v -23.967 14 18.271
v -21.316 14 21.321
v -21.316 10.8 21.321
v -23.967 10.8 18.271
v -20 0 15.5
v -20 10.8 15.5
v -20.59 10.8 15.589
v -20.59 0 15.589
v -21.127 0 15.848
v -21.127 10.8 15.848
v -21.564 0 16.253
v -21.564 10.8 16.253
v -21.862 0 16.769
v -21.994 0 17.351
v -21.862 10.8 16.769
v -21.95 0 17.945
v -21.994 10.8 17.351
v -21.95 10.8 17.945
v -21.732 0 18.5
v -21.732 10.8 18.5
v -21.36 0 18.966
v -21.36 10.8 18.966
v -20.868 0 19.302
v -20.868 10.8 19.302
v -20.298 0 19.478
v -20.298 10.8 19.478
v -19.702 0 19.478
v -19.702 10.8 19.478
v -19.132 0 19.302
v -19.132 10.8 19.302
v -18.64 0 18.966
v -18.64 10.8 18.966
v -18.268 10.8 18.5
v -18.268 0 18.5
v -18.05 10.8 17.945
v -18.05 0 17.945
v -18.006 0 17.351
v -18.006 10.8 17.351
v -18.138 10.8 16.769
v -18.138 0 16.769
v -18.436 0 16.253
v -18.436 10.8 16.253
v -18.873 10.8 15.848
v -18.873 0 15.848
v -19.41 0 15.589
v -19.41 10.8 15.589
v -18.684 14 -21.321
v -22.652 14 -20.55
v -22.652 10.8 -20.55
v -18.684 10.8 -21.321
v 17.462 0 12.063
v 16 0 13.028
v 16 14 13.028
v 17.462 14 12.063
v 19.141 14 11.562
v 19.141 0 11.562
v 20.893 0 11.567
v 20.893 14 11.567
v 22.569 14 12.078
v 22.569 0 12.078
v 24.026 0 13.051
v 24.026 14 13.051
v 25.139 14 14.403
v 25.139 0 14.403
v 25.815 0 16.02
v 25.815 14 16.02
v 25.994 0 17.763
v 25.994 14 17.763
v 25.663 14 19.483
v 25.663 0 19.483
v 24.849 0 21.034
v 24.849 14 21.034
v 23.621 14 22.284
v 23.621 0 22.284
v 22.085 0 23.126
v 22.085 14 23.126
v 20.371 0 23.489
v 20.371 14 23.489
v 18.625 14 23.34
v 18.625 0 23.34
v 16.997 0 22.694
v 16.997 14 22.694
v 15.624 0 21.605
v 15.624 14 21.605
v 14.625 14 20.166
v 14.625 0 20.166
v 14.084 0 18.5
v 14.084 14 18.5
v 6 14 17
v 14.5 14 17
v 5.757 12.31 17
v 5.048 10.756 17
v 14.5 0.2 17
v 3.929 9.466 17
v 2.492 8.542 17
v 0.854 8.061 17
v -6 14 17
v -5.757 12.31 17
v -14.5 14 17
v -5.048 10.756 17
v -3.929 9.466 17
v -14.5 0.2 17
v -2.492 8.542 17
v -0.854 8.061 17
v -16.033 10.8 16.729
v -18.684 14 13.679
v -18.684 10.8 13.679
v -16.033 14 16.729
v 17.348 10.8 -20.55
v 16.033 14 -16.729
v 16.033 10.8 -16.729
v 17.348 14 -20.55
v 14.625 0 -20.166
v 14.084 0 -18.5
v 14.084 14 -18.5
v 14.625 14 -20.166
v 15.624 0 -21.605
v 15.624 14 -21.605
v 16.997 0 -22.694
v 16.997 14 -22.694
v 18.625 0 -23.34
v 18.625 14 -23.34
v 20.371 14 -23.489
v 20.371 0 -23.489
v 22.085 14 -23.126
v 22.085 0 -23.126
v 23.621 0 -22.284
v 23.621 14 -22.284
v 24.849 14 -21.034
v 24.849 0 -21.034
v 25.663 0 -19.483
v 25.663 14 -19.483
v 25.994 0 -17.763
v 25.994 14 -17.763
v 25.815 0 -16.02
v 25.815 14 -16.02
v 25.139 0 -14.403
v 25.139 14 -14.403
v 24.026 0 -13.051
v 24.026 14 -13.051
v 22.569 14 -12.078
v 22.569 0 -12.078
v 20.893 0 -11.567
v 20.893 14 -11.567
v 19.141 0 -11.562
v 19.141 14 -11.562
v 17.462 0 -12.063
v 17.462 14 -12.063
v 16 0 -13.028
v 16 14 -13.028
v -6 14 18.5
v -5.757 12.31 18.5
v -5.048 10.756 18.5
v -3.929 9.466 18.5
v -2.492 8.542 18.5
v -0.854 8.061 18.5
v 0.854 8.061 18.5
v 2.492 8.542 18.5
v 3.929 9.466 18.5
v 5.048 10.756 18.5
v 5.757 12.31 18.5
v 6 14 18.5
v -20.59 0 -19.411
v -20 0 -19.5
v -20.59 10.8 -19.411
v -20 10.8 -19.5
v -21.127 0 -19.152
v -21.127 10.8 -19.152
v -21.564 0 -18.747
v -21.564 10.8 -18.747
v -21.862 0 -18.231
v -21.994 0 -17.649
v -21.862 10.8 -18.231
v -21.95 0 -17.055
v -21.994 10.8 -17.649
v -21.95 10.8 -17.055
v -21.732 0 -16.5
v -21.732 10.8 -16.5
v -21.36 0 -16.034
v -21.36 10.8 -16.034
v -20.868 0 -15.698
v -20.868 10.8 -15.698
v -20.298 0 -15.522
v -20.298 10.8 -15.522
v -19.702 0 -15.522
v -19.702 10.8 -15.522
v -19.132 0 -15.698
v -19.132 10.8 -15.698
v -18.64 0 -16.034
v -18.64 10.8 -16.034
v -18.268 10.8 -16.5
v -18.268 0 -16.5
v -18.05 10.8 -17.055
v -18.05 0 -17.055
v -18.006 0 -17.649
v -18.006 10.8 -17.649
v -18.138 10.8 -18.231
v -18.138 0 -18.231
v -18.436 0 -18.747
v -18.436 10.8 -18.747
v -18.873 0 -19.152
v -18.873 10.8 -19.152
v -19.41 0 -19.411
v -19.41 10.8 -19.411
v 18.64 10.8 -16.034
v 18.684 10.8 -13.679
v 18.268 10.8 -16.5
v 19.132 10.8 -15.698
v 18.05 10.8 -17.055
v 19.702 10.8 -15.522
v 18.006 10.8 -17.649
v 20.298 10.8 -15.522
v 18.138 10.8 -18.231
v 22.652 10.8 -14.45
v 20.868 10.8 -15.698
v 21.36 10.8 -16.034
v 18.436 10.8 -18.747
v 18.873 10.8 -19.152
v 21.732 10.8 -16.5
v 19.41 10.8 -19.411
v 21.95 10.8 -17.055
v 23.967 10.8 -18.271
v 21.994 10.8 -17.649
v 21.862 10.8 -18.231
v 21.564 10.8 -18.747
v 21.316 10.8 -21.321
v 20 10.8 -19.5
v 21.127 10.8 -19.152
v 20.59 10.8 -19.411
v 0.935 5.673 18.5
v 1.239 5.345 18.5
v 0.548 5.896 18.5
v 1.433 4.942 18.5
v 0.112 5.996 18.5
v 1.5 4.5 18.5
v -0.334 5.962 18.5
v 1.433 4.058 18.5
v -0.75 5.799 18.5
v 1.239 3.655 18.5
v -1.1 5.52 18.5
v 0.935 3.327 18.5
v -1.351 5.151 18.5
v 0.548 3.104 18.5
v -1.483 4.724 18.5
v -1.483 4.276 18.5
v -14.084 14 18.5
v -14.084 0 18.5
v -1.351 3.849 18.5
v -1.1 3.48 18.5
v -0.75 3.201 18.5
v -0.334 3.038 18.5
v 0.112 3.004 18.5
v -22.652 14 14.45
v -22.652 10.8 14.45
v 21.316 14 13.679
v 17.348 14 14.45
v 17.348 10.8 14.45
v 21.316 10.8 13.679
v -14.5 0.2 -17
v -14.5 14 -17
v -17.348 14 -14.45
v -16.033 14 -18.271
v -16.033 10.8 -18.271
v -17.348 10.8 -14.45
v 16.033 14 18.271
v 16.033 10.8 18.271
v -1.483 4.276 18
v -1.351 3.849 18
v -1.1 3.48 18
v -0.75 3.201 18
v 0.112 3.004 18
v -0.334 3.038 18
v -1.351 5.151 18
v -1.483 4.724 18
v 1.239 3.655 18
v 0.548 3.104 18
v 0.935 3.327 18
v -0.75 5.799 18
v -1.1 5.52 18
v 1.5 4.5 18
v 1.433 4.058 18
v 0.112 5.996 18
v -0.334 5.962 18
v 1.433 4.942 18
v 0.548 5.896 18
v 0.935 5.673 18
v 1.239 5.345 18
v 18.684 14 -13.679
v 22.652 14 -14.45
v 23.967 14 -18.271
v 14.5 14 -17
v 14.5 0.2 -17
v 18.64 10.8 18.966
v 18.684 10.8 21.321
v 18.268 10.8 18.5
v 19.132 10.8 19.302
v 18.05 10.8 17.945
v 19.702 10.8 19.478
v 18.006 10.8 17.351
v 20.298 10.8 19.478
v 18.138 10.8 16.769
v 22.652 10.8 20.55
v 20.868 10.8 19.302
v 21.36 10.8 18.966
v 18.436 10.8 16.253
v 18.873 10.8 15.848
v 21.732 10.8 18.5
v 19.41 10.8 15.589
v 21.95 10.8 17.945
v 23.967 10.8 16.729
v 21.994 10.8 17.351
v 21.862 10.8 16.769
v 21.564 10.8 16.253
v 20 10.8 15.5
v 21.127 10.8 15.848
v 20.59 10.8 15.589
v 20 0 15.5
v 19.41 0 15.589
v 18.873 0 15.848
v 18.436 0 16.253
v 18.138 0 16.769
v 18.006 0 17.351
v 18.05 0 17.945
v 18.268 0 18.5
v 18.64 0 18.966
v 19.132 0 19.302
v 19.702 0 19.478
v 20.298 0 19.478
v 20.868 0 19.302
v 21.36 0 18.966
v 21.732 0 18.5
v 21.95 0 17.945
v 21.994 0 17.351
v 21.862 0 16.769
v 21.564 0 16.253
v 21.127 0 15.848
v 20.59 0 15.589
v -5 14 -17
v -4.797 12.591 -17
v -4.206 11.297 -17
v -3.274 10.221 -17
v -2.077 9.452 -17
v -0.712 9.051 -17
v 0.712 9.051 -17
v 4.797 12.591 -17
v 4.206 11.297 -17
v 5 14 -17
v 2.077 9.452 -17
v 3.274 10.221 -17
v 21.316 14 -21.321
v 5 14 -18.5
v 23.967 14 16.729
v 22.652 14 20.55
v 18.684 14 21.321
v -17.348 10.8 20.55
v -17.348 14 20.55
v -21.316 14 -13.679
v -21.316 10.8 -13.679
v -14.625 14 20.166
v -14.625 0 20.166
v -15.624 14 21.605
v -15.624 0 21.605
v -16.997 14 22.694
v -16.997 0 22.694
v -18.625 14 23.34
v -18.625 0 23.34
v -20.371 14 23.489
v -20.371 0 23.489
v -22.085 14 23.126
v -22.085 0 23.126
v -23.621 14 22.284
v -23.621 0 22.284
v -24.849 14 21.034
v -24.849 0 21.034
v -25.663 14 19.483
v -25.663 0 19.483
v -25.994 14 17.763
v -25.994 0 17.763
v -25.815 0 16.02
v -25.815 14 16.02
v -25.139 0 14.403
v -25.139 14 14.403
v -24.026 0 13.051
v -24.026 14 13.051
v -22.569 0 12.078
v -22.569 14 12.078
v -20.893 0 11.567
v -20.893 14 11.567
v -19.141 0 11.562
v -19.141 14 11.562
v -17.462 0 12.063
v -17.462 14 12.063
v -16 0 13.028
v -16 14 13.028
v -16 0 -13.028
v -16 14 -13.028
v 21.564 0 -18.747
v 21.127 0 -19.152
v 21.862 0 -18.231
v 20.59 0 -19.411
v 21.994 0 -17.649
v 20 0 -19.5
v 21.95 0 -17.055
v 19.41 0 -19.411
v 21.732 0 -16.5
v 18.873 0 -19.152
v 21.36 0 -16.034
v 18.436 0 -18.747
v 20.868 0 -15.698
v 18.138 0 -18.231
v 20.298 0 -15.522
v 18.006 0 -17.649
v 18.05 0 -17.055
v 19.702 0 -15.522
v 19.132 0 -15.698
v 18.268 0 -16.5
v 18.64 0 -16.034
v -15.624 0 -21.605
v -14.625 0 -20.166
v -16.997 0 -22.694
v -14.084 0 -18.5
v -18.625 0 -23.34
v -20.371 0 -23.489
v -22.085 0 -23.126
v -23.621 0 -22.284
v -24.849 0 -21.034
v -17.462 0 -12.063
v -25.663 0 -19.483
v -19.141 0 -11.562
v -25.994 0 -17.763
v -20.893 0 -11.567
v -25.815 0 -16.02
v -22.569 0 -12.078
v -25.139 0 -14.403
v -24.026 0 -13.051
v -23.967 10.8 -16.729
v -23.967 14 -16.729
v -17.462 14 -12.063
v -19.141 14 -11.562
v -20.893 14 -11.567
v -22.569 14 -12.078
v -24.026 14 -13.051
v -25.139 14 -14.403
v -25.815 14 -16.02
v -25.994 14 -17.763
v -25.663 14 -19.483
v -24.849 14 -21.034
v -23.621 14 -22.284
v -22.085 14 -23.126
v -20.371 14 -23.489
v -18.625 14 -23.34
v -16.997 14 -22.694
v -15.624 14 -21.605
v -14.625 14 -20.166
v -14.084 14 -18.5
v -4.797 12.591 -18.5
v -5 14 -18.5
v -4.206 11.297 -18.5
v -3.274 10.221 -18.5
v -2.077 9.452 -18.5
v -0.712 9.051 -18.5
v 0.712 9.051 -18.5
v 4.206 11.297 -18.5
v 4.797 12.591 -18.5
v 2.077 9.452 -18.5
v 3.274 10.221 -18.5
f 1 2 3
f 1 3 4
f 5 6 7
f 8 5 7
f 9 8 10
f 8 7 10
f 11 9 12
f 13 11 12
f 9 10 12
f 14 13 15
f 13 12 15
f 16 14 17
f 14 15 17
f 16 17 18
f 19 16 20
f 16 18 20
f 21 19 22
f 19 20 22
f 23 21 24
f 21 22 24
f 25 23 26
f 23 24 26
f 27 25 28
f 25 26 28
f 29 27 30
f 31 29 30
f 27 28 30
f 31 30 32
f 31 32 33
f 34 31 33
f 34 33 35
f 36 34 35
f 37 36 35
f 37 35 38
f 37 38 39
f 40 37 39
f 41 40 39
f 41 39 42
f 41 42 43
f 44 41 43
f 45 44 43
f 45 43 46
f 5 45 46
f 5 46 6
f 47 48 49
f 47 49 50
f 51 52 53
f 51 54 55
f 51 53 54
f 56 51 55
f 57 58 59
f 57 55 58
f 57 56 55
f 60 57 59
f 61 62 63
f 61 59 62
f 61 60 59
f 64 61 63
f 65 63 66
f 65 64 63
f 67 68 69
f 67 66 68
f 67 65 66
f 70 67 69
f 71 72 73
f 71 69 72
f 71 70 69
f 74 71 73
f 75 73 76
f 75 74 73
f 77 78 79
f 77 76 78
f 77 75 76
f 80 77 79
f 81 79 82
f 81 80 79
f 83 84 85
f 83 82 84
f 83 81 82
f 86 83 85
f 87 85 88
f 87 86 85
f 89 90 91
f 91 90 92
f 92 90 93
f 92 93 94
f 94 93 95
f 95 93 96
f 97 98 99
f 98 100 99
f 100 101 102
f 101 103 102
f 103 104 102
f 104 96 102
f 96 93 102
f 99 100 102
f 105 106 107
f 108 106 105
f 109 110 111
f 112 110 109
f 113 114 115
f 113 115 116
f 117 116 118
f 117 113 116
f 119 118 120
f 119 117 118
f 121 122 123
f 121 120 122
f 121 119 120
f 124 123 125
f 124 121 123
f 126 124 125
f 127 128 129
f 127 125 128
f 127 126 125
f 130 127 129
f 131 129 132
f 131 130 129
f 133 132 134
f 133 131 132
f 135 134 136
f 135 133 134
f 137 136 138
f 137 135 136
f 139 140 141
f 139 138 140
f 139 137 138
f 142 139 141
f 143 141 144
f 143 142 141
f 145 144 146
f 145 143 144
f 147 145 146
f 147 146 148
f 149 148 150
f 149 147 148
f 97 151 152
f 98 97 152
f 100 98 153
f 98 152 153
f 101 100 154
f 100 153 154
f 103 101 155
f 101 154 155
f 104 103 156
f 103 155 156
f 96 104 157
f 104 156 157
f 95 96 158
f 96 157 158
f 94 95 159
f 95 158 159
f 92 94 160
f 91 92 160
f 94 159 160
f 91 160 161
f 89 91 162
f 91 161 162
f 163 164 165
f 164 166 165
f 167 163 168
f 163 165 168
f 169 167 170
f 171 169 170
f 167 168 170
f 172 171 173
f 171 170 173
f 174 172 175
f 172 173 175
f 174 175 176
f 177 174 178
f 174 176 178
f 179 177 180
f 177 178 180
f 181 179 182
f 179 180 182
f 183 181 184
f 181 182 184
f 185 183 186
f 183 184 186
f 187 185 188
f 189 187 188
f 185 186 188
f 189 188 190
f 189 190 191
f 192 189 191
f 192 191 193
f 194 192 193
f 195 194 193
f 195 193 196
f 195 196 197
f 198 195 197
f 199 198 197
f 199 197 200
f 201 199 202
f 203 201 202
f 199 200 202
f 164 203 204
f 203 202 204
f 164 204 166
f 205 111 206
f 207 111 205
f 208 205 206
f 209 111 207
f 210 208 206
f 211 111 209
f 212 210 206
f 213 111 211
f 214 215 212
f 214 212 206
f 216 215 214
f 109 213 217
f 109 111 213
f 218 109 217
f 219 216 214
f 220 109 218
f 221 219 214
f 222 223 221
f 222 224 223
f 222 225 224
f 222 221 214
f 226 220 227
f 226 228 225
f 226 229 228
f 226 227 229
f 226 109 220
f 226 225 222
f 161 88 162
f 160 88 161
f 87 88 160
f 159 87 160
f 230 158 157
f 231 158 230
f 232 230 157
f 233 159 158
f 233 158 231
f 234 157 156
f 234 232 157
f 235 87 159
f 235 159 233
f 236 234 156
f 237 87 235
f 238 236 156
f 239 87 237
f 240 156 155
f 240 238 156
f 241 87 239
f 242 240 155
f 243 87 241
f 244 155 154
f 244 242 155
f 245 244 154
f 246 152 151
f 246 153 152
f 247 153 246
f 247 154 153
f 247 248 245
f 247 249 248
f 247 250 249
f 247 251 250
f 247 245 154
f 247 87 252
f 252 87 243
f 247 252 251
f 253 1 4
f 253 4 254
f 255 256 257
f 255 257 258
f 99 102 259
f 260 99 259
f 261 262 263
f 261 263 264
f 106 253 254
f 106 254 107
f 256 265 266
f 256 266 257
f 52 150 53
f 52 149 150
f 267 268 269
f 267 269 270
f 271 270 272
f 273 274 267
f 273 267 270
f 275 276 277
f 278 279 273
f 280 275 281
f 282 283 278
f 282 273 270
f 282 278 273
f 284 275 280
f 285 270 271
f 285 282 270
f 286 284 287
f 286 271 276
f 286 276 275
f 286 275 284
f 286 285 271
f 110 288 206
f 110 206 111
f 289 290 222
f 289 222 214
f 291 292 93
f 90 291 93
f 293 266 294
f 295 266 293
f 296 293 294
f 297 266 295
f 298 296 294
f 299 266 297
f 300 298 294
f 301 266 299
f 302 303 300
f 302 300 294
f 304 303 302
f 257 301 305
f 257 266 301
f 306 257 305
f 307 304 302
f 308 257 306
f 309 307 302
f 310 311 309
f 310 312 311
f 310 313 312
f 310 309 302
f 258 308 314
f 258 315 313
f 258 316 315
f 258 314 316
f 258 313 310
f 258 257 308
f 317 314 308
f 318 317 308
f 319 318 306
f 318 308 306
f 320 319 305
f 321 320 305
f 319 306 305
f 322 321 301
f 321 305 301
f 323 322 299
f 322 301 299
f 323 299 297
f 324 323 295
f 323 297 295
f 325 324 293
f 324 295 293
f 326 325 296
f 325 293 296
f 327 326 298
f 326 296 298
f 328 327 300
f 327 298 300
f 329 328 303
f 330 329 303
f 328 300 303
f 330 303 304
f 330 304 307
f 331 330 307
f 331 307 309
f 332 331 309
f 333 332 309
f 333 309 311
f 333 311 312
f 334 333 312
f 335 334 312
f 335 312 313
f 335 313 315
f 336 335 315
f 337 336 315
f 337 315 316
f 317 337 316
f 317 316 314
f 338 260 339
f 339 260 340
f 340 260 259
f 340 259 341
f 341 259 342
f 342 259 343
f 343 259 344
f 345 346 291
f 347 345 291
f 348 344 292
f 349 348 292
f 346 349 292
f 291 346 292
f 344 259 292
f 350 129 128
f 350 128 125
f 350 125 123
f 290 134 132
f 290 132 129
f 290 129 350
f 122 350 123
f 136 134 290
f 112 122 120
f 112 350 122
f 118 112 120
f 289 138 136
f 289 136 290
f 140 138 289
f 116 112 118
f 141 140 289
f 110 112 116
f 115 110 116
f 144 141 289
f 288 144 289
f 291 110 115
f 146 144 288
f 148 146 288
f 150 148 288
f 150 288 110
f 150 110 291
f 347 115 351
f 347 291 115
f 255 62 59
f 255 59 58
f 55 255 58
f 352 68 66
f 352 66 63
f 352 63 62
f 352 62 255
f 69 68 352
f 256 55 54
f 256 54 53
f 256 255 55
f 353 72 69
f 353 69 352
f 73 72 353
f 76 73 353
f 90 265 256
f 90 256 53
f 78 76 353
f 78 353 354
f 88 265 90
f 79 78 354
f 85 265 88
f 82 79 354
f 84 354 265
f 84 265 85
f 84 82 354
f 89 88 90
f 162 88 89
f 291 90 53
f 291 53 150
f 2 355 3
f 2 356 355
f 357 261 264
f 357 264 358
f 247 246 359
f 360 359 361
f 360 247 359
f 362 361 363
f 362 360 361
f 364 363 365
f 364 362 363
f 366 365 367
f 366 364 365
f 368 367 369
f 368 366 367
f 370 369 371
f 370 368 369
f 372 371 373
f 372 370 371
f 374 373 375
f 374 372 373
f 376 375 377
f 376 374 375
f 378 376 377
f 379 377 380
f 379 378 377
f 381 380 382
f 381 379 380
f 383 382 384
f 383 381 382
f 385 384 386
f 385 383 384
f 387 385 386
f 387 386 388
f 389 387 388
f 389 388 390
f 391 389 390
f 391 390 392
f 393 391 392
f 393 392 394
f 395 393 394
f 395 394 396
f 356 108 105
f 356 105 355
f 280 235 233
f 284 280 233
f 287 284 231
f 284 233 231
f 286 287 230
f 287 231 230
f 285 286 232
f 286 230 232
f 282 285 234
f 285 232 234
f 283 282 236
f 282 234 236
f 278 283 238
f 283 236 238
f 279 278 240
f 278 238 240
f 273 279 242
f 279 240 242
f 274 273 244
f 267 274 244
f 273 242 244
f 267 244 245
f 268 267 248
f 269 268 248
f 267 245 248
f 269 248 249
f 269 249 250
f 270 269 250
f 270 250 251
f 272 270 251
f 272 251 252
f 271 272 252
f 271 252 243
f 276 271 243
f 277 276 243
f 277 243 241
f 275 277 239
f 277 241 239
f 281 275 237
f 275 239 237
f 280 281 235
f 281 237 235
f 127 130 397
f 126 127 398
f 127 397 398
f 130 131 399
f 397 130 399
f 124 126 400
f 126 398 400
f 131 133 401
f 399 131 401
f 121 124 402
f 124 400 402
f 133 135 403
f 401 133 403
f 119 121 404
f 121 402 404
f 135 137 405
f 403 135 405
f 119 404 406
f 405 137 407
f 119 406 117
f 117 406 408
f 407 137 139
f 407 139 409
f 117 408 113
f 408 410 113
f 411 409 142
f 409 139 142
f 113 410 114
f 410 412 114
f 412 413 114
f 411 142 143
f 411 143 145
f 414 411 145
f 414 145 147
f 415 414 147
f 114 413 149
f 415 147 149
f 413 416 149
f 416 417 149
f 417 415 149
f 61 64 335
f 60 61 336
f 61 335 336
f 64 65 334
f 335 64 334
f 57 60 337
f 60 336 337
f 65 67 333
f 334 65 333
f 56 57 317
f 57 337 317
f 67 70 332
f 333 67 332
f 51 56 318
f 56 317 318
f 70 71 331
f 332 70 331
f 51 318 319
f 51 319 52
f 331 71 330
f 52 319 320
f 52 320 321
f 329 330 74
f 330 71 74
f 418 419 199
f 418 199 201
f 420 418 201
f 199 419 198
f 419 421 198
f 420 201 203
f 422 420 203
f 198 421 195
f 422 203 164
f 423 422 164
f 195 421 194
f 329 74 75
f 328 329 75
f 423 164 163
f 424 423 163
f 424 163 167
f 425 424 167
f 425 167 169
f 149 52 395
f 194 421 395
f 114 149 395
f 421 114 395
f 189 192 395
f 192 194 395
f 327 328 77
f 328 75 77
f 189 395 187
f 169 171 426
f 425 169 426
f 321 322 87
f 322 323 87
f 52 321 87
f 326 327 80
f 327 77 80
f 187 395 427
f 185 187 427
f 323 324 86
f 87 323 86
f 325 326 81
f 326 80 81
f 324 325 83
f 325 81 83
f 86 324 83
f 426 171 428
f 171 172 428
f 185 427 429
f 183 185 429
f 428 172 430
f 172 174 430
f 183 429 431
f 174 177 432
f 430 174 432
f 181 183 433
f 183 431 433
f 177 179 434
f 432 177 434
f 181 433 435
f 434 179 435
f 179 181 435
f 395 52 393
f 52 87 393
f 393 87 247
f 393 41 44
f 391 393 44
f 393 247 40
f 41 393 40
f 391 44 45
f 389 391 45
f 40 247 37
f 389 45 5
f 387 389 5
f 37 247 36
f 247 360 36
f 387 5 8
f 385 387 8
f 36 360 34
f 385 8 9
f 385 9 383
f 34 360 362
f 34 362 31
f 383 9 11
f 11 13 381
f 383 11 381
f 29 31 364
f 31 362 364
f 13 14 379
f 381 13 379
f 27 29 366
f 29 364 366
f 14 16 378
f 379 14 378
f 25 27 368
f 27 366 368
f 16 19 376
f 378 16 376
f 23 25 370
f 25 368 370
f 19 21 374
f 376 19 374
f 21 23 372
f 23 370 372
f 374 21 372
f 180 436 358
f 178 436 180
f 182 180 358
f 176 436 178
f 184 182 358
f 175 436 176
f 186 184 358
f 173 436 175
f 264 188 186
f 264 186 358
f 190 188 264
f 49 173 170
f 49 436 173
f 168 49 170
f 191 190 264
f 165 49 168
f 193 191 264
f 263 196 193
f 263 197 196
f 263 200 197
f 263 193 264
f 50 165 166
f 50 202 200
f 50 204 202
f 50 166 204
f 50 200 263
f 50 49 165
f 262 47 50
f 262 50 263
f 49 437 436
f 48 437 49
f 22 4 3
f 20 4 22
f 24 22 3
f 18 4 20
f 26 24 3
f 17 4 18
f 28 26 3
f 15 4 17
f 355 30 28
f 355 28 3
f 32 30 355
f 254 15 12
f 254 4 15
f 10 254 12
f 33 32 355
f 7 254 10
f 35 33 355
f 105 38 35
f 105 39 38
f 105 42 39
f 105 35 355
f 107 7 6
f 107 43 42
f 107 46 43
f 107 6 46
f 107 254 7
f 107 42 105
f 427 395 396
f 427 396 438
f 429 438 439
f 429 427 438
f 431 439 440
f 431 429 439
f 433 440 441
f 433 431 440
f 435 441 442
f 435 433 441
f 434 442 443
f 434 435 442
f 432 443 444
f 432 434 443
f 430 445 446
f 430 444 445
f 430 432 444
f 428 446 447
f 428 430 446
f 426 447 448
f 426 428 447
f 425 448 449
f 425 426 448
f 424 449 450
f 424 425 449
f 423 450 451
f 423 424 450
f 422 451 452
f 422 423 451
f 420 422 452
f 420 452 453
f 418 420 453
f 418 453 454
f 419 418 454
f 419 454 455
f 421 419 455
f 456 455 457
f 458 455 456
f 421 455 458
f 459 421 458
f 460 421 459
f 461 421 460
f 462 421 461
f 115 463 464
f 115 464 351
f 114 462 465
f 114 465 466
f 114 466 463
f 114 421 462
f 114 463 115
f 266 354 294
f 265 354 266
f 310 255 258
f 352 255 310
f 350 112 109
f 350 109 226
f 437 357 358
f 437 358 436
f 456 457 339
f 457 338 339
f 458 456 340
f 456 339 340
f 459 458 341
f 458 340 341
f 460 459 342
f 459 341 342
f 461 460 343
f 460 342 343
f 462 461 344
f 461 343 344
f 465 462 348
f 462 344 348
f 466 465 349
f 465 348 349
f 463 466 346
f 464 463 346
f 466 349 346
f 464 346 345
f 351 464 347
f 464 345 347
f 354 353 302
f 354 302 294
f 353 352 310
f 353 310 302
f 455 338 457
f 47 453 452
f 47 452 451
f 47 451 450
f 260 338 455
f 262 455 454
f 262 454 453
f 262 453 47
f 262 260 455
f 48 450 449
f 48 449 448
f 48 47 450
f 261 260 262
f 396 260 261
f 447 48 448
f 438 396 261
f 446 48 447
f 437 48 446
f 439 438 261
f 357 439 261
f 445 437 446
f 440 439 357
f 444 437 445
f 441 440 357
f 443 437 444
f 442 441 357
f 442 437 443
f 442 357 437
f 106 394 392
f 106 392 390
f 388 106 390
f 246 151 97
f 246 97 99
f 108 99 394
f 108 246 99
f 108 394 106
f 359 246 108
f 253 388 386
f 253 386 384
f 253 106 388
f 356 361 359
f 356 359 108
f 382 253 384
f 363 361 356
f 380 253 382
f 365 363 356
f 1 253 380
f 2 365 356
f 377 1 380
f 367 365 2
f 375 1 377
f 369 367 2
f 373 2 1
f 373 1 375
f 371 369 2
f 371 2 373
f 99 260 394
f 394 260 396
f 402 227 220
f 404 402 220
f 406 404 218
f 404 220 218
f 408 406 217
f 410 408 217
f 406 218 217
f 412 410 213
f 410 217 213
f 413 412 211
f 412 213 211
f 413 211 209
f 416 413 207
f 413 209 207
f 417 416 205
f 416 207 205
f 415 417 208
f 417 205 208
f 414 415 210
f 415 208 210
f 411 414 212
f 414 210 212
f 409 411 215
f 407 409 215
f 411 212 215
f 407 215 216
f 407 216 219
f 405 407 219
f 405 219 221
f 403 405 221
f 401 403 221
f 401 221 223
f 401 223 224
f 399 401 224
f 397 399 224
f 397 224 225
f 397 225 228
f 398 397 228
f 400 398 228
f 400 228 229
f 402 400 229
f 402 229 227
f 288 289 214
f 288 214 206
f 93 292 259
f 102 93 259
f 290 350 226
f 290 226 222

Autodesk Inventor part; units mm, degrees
ref_plane "YZ Plane" through (0, 0, 0) normal (1, 0, 0) x (0, 1, 0)
ref_plane "XZ Plane" through (0, 0, 0) normal (0, 1, 0) x (-1, 0, 0)
ref_plane "XY Plane" through (0, 0, 0) normal (0, 0, 1) x (1, 0, 0)
sketch "Sketch1" plane through (0, 0, 0) normal (0, 1, 0) x (-1, 0, 0)
  line L0 (-14.5, 17) -> (14.5, 17)
  line L1 (14.5, 17) -> (14.5, -17)
  line L2 (14.5, -17) -> (-14.5, -17)
  line L3 (-14.5, -17) -> (-14.5, 17)
  line L4 (-14.5, 17) -> (14.5, -17) construction
  line L5 (14.5, 17) -> (-14.5, -17) construction
  circle A0 centre (-20, 17.5) radius 6
  circle A1 centre (20, 17.5) radius 6
  circle A2 centre (20, -17.5) radius 6
  circle A3 centre (-20, -17.5) radius 6
  line L6 (-16, 18.5) -> (16, 18.5)
  line L7 (16, 18.5) -> (16, -18.5)
  line L8 (16, -18.5) -> (-16, -18.5)
  line L9 (-16, -18.5) -> (-16, 18.5)
  line L10 (-16, 18.5) -> (16, -18.5) construction
  line L11 (16, 18.5) -> (-16, -18.5) construction
  point P0 (0, 0)
  point P1 (-16, -13.0279)
  point P2 (-14.0839, -18.5)
  point P3 (14.0839, -18.5)
  point P4 (16, -13.0279)
  point P5 (16, 13.0279)
  point P6 (14.0839, 18.5)
  point P7 (-14.0839, 18.5)
  point P8 (-16, 13.0279)
  point P9 (-14.5, -15.1021)
  point P10 (-14.0209, -17)
  point P11 (14.0209, -17)
  point P12 (14.5, -15.1021)
  point P13 (14.5, 15.1021)
  point P14 (14.0209, 17)
  point P15 (-14.0209, 17)
  point P16 (-14.5, 15.1021)
  dimension "d0" = 29
  dimension "d1" = 34
  dimension "d2" = 12
  dimension "d3" = 12
  dimension "d4" = 12
  dimension "d5" = 12
  dimension "d6" = 35
  dimension "d8" = 40
  dimension "d9" = 40
  dimension "d13" = 5.5
  dimension "d14" = 0.5
  dimension "d15" = 1.5
  dimension "d16" = 1.5
extrude "Extrusion1" add sketch "Sketch1" along normal blind 14 contours L3 A0 L9 L6 L0 | A0 L6 A1 L0 | L3 A3 L9 A0 | A1 L6 L7 L1 L0 | L3 L2 A3 L8 L9 | A0 L6 L9 | A1 L7 L6 | A1 L7 A2 L1 | L2 A2 L8 A3 | L9 L8 A3 | A2 L7 L8 L2 L1 | A2 L8 L7
extrude "Extrusion2" add sketch "Sketch1" along normal blind 0.2 contours L0 A1 L1 A2 L2 A3 L3 A0
hole "Hole1" at (-20, 0, -17.5) at (20, 0, -17.5) at (20, 0, 17.5) at (-20, 0, 17.5) direction (0, 1, 0) diameter 4 end through all
extrude "Extrusion3" add sketch "Sketch1" along normal blind 0.2 contours L0 A0 L3 | L0 L1 A1 | A3 L2 L3 | L1 L2 A2
sketch "Sketch2" plane through (0, 14, 0) normal (0, 1, 0) x (1, 0, 0)
  arc A0 (-16, -13.0279) -> (-14.0839, -18.5) centre (-20, -17.5) ccw projected
  line L0 (-17.3483, -20.5499) -> (-21.3155, -21.3214)
  line L1 (-21.3155, -21.3214) -> (-23.9671, -18.2714)
  line L2 (-23.9671, -18.2714) -> (-22.6517, -14.4501)
  line L3 (-22.6517, -14.4501) -> (-18.6845, -13.6786)
  line L4 (-18.6845, -13.6786) -> (-16.0329, -16.7286)
  line L5 (-16.0329, -16.7286) -> (-17.3483, -20.5499)
  line L6 (-10.7502, -12.1358) -> (-10.7502, 6.4156) construction
  line L7 (-10.7502, 6.4156) -> (-3.4446, 6.4156) construction
  line L8 (-22.6517, 20.5499) -> (-18.6845, 21.3214)
  line L9 (-18.6845, 21.3214) -> (-16.0329, 18.2714)
  line L10 (-16.0329, 18.2714) -> (-17.3483, 14.4501)
  line L11 (-17.3483, 14.4501) -> (-21.3155, 13.6786)
  line L12 (-21.3155, 13.6786) -> (-23.9671, 16.7286)
  line L13 (-23.9671, 16.7286) -> (-22.6517, 20.5499)
  line L14 (17.3483, -14.4501) -> (21.3155, -13.6786)
  line L15 (21.3155, -13.6786) -> (23.9671, -16.7286)
  line L16 (23.9671, -16.7286) -> (22.6517, -20.5499)
  line L17 (22.6517, -20.5499) -> (18.6845, -21.3214)
  line L18 (18.6845, -21.3214) -> (16.0329, -18.2714)
  line L19 (16.0329, -18.2714) -> (17.3483, -14.4501)
  line L20 (17.3483, 20.5499) -> (21.3155, 21.3214)
  line L21 (21.3155, 21.3214) -> (23.9671, 18.2714)
  line L22 (23.9671, 18.2714) -> (22.6517, 14.4501)
  line L23 (22.6517, 14.4501) -> (18.6845, 13.6786)
  line L24 (18.6845, 13.6786) -> (16.0329, 16.7286)
  line L25 (16.0329, 16.7286) -> (17.3483, 20.5499)
  point P0 (0, 0)
  dimension "d30" = 7
  dimension "d33" = 35
  dimension "d36" = 40
extrude "Extrusion4" cut sketch "Sketch2" against normal blind 3.2
sketch "Sketch3" plane through (-14.0839, 0, 18.5) normal (0, 0, 1) x (1, 0, 0)
  line L0 (28.1678, 14) -> (0, 14) projected
  arc A0 (8.0839, 14) -> (20.0839, 14) centre (14.0839, 14) ccw
  point P0 (14.0839, 0)
  dimension "d41" = 12
extrude "Extrusion5" cut sketch "Sketch3" against normal up to surface (1.5 mm away)
sketch "Sketch4" plane through (-14.5, 14, -17) normal (0, 0, 1) x (1, 0, 0)
  line L0 (0, 0) -> (29, 0) projected
  arc A0 (9.5, 0) -> (19.5, 0) centre (14.5, 0) ccw
  point P0 (14.5, -14)
  dimension "d44" = 10
extrude "Extrusion6" cut sketch "Sketch4" against normal through all
sketch "Sketch5" plane through (-14.0839, 0, 18.5) normal (0, 0, 1) x (1, 0, 0)
  circle A0 centre (14.0839, 4.5) radius 1.5
  line L0 (0, 0) -> (-11.9161, 0) projected
  point P0 (14.0839, 0)
  point P1 (-1.9161, 0)
  dimension "d47" = 3
  dimension "d48" = 4.5
extrude "Extrusion7" cut sketch "Sketch5" against normal blind 0.5
properties part number "_UCHWYT_DUZY_SILNIK"
